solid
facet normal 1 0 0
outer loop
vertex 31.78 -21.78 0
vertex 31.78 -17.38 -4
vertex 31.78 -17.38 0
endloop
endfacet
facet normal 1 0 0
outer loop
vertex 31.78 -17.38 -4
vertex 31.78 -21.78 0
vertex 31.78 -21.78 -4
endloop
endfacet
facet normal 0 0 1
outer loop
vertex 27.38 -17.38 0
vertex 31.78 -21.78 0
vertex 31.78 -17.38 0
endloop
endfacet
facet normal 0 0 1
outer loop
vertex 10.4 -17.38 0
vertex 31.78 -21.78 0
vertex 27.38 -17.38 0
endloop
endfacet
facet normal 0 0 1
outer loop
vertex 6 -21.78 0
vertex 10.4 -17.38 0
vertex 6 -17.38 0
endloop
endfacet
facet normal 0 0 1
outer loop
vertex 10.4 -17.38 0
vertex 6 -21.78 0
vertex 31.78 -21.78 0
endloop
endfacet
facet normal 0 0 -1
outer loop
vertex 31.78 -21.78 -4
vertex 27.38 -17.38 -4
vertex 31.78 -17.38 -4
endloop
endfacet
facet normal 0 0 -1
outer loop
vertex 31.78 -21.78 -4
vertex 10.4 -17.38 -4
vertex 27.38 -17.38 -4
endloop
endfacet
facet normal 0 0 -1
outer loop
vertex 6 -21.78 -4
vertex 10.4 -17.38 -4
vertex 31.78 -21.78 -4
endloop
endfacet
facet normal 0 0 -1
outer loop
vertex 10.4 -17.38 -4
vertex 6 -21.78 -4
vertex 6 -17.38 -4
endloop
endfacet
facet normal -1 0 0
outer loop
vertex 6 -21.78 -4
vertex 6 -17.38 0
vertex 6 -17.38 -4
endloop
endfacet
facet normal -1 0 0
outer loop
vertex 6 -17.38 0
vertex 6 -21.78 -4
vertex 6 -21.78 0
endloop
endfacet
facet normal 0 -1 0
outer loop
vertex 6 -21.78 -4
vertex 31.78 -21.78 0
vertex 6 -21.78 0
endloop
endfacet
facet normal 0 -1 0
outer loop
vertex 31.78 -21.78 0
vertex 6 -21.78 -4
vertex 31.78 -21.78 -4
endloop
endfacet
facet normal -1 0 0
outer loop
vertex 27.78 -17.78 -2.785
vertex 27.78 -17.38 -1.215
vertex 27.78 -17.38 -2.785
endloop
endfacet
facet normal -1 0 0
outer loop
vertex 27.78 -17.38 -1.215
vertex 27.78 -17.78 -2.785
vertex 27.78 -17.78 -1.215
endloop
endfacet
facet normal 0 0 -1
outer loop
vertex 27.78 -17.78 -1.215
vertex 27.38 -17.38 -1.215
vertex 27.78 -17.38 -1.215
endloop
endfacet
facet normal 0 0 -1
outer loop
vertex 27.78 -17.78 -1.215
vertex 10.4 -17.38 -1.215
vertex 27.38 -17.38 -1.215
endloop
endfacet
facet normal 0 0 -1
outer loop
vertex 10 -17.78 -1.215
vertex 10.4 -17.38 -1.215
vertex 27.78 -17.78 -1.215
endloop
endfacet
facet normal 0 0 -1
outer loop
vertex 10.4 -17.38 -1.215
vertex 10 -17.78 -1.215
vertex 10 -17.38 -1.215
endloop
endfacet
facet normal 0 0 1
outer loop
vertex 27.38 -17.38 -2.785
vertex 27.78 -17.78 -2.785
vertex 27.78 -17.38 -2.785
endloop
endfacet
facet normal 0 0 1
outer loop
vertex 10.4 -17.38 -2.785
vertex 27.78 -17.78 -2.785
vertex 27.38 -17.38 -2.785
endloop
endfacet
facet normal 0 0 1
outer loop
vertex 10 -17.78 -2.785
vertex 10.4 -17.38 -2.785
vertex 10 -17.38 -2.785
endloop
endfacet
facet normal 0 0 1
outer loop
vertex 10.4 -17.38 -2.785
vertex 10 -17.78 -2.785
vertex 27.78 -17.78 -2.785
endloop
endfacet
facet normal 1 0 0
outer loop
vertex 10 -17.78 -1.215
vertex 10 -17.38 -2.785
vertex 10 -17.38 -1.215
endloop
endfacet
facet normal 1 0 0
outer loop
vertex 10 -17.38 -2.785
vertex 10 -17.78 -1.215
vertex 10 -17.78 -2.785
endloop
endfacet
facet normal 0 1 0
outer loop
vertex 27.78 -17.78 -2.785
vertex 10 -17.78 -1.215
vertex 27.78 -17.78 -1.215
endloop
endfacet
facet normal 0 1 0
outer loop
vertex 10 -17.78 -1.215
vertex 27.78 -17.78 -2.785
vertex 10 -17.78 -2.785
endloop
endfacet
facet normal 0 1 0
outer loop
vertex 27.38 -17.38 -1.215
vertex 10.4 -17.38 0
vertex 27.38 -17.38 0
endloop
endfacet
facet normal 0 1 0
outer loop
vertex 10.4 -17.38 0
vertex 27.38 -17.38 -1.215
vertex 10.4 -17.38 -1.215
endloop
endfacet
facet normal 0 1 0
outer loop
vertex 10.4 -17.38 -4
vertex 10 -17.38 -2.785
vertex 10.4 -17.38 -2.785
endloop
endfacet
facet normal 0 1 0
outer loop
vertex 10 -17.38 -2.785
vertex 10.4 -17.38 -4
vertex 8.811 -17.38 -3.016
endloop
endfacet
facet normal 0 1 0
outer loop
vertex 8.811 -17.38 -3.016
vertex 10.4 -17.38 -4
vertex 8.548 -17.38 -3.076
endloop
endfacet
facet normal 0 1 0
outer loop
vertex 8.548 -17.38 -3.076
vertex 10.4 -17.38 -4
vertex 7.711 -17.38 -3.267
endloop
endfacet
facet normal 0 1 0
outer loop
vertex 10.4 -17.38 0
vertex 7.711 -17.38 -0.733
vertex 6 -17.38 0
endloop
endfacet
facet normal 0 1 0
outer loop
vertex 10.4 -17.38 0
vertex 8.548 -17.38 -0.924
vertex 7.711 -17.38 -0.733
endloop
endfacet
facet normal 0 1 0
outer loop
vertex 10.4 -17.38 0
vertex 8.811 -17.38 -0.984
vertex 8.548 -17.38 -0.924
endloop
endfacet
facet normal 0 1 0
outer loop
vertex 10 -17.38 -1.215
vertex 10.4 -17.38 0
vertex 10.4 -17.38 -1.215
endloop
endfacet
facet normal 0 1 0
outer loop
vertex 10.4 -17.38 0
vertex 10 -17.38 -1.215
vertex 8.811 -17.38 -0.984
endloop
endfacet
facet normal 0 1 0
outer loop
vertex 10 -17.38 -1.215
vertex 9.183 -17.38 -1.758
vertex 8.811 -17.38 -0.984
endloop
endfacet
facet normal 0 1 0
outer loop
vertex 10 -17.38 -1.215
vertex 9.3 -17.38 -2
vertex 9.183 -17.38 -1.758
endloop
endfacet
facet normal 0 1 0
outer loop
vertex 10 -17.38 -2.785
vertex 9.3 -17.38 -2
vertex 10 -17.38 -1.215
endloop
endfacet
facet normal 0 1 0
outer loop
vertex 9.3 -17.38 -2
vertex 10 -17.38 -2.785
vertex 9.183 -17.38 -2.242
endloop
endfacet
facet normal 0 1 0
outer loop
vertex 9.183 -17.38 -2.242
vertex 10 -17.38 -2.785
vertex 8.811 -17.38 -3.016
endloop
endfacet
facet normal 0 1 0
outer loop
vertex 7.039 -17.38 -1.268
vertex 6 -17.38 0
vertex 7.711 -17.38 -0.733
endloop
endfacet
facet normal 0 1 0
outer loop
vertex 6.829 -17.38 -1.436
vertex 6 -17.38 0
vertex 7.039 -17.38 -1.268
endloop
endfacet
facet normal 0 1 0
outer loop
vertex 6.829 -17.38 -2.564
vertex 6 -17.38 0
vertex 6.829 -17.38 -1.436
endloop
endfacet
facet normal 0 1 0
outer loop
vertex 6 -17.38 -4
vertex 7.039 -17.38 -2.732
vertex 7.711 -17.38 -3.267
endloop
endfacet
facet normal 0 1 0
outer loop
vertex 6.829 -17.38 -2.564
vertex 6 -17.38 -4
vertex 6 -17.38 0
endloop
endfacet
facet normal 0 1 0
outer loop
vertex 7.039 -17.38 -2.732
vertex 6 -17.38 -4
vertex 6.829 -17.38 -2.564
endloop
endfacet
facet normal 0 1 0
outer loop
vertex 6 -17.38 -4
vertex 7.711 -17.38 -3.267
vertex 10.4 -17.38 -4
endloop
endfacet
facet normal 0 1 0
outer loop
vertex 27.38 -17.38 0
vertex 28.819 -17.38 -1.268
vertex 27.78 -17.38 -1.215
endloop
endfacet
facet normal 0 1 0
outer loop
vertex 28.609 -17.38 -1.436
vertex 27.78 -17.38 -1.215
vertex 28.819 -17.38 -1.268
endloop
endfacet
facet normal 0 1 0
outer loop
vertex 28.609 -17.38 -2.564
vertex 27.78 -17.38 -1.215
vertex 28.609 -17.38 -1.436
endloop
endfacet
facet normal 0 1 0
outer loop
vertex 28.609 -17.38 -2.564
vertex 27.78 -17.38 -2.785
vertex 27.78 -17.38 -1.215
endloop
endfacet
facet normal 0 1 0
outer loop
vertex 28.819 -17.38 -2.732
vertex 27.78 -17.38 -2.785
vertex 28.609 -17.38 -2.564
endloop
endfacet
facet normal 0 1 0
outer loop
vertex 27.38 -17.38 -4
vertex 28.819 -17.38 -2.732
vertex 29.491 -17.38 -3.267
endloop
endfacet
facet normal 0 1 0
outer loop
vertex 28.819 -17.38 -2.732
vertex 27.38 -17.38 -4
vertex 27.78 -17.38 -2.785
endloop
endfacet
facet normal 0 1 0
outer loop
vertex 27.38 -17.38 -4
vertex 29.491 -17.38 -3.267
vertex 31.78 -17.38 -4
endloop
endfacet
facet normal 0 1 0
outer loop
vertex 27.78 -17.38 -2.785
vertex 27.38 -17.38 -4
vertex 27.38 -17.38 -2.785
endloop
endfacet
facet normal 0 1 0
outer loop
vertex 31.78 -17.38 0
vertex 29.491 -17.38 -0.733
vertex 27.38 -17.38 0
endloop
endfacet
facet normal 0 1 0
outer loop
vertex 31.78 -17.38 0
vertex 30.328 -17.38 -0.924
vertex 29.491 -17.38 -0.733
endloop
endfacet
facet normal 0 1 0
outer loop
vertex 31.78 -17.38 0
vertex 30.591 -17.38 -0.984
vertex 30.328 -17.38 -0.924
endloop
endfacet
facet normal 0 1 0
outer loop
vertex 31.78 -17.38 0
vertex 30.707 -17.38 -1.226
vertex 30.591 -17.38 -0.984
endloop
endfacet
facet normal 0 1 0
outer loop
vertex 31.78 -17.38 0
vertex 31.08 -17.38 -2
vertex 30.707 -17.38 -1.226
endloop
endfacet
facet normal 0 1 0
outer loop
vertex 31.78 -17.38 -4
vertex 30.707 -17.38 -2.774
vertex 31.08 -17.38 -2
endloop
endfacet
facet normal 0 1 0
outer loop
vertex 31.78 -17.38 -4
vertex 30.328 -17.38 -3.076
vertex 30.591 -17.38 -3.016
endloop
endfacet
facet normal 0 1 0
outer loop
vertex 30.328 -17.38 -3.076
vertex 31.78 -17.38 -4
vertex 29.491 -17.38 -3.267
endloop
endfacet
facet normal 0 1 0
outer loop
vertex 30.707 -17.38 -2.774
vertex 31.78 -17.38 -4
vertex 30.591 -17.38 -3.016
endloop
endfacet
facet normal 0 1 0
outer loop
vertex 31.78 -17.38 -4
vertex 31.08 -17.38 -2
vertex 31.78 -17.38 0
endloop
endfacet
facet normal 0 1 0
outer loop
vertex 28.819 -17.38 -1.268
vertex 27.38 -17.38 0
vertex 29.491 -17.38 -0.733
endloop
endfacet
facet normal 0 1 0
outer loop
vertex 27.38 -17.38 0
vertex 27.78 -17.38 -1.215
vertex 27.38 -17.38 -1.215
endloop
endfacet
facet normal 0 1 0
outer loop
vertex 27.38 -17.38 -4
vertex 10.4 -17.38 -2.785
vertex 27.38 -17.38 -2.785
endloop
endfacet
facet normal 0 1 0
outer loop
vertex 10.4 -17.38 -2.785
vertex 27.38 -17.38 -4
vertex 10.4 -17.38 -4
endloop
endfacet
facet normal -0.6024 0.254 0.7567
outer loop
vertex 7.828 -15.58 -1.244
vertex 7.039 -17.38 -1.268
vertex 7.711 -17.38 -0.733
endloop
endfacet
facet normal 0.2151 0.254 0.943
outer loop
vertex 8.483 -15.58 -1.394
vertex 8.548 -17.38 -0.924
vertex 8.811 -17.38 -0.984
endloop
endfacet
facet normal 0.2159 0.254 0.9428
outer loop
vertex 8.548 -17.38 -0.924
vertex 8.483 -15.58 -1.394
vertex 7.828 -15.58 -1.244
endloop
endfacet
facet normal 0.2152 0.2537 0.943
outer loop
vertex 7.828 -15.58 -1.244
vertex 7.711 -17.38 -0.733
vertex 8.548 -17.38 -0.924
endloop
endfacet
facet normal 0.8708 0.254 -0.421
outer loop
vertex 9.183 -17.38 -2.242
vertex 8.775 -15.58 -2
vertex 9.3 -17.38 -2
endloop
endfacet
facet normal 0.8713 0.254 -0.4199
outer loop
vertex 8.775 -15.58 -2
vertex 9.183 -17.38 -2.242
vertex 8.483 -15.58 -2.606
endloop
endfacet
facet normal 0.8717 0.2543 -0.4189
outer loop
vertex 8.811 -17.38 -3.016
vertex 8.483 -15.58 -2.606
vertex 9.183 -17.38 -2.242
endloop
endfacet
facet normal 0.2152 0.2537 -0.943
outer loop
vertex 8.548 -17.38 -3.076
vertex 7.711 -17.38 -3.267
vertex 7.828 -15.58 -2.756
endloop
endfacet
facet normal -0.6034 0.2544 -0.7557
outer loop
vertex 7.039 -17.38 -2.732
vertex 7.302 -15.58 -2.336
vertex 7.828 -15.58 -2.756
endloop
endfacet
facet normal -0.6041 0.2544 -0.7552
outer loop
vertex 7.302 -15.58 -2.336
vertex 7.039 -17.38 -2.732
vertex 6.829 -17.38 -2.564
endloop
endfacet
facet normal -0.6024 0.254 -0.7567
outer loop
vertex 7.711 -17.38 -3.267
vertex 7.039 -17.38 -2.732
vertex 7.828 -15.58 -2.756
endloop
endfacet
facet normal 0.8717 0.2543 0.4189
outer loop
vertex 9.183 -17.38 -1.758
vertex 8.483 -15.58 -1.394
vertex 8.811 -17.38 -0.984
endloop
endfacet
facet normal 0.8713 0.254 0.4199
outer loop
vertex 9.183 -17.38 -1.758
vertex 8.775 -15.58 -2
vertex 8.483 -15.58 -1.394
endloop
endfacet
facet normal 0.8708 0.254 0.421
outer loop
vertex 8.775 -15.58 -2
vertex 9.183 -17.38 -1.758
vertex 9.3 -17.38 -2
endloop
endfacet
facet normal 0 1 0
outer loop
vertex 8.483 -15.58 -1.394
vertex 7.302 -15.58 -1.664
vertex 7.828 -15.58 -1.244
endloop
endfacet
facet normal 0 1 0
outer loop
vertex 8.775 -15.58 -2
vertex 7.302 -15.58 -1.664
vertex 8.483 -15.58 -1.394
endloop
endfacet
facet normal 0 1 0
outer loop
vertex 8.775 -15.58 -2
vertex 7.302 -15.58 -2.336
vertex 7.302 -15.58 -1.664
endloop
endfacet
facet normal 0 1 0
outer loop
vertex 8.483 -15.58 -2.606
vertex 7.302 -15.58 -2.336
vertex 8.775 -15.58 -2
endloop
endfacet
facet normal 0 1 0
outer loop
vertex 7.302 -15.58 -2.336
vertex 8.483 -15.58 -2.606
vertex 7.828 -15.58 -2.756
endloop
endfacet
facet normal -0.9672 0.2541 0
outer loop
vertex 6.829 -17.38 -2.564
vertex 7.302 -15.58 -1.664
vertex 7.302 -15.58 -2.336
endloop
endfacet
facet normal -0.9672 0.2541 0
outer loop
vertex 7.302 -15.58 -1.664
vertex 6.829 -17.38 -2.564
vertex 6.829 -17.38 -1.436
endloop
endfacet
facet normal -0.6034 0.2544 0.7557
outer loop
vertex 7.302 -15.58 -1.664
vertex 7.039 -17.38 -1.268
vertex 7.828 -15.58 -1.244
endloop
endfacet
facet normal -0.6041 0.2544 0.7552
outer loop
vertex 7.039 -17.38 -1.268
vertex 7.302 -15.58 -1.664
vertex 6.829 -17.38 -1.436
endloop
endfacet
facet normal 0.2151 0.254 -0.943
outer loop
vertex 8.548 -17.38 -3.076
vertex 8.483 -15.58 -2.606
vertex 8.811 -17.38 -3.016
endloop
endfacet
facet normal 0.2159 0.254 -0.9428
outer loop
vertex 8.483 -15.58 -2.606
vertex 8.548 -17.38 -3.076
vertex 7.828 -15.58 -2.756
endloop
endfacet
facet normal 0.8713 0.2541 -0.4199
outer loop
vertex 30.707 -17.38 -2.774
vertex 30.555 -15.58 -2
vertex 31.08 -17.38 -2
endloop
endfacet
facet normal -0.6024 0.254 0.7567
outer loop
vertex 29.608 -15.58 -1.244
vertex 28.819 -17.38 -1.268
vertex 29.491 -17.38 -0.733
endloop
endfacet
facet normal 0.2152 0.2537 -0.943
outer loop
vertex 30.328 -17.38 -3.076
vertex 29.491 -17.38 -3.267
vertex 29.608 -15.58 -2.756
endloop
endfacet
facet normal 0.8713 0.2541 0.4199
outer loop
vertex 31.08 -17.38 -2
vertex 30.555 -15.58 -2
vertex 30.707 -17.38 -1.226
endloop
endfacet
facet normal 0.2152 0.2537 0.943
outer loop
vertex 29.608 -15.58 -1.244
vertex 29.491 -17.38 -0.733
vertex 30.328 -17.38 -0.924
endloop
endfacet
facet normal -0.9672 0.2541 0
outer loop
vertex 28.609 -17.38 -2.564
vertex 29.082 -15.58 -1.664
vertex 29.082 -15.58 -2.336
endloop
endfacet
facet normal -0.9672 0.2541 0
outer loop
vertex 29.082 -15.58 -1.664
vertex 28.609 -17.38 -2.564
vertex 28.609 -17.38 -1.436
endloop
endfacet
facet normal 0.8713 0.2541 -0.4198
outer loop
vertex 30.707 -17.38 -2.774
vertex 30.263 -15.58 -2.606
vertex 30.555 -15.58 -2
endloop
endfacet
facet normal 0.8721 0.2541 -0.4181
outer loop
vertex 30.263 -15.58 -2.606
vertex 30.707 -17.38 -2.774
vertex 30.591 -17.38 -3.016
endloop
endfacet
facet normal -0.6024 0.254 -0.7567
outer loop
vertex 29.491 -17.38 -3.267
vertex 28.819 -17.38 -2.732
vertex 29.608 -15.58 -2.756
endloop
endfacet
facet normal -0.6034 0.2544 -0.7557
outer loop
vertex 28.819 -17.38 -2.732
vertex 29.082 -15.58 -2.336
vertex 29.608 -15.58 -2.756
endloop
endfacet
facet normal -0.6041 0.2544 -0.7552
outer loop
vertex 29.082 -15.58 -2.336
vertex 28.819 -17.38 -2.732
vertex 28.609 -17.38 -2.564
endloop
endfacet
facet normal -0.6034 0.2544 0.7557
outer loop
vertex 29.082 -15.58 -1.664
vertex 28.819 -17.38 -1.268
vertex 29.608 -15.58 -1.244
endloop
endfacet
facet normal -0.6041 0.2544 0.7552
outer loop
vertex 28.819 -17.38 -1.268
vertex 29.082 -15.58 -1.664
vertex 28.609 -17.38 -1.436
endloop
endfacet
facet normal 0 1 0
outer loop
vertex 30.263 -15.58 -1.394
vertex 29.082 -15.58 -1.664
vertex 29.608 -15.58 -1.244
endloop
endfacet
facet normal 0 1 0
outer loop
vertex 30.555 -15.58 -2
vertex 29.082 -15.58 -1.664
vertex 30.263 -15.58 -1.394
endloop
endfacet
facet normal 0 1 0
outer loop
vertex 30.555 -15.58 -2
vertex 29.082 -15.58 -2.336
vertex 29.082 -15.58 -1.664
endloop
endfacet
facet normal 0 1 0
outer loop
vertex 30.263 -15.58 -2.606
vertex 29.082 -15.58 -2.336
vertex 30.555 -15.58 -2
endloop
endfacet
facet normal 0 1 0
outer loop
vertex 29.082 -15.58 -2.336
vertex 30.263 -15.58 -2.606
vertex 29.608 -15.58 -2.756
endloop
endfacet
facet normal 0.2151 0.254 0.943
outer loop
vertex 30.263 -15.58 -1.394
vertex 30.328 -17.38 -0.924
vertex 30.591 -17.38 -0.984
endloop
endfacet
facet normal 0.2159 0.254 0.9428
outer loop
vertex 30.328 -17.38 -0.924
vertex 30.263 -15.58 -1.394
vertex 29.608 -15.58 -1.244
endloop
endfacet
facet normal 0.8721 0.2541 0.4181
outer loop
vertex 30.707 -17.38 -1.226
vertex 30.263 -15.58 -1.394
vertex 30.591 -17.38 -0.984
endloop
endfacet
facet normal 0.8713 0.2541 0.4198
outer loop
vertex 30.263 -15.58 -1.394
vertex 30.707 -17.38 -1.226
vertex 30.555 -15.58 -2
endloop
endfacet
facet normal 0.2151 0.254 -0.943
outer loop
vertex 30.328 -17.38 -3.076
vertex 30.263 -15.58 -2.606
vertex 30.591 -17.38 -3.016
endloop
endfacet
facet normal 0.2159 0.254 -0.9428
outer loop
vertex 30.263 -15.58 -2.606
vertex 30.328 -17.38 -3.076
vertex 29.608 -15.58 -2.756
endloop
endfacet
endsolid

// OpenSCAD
// file: teensy-holder.scad
/*
--- BEGIN AGPLv3-preamble ---
Dactyl Marshmallow ergonomic keyboard generator
Copyright (C) 2015, 2018 Matthew Adereth and Jared Jennings

This program is free software: you can redistribute it and/or modify
it under the terms of the GNU Affero General Public License as published by
the Free Software Foundation, either version 3 of the License, or
(at your option) any later version.

This program is distributed in the hope that it will be useful,
but WITHOUT ANY WARRANTY; without even the implied warranty of
MERCHANTABILITY or FITNESS FOR A PARTICULAR PURPOSE.  See the
GNU Affero General Public License for more details.

You should have received a copy of the GNU Affero General Public License
along with this program.  If not, see <http://www.gnu.org/licenses/>.
--- END AGPLv3-preamble ---
*/
/*
*/
frame_thickness = 4;
small=0.01;
tau=360;

/* https://www.pjrc.com/teensy/dimensions.html
teensy lc */
tb_width = 17.78;
tb_length = 35.56;
tb_thickness = 1.57;
tb_margin = 0.8;

/* https://www.cs.jhu.edu/~carlson/download/datasheets/Micro-USB_1_01.pdf
*/
overmold_width = 11;
overmold_height = 9;

/* How much smaller the bumps are than the holes. First refined in the
 * frame glue joints. */
bump_tolerance = 0.1;
/* Hole diameter is set empirically, so that given the fn used, it
looks like the walls of the hole will be thick enough */
hole_diameter = frame_thickness - 0.5;
hole_fn = 7;

/* M3 screw */
screw_diameter = 3;

module teensy_holder() {
    difference() {
        union() {
             /* square at USB end leaving clearance for largest
              * possible connector overmold */
            translate([0, 
            tb_length/2+frame_thickness/2, 0]) {
                cube(size=[
                overmold_width+2*frame_thickness,
                frame_thickness,
                overmold_height+2*frame_thickness],
                center=true);
            }
            /* main frame */
            cube(size=[
                tb_width+2*frame_thickness,
                tb_length+2*frame_thickness,
                frame_thickness], center=true);
        }
        /* the board */
        cube(size=[
            tb_width, tb_length,
            tb_thickness],
            center=true);
        /* a little extra plastic on top and below the board, to hold
         * it in */
        cube(size=[
            tb_width - tb_margin,
            tb_length - tb_margin,
            frame_thickness+small],
            center=true);
        /* connector overmold */
        translate([0, tb_length/2, 0]) {
            cube(size=[
            overmold_width,
            2*frame_thickness+small,
            overmold_height], center=true);
        }
        /* you know, i bet we don't need the bottom half of that
         * overmold surround */
        translate([0, 0, -(frame_thickness/2 + overmold_height/2)]) {
             cube(size=[2*tb_width, 2*tb_length, overmold_height],
                  center=true);
        }
    }
}

/* left of x=0 */
module tab () {
     translate([-screw_diameter*2, 0, 0]) {
          difference () {
               union () {
                    cylinder(h=frame_thickness,
                             d=screw_diameter+frame_thickness*2,
                             center=true,
                             $fn=15);
                    translate([screw_diameter, 0, 0]) {
                         cube([screw_diameter*2,
                               screw_diameter+frame_thickness*2,
                               frame_thickness],
                              center=true);
                    }
               }
               cylinder(h=frame_thickness+small,
                        d=screw_diameter,
                        center=true,
                        $fn=15);
          }
     }
}

module teensy_holder_piece_a () {
     translate([(tb_width/2+frame_thickness+screw_diameter*2),
                0,
                (-frame_thickness/2)]) {
          union() {
               difference() {
                    intersection() {
                         translate([0, frame_thickness+tb_margin/2+small/2, 0]) {
                              cube(size=[
                                        tb_width+2*frame_thickness+small,
                                        tb_length+2*frame_thickness+small,
                                        overmold_height+2*frame_thickness+small],
                                   center=true);
                         }
                         teensy_holder() {}
                    }
                    translate([-(tb_width/2 + frame_thickness/2),
                               -(tb_length/2 + tb_margin),
                               0]) {
                         rotate(-tau/4,[1,0,0]) {
                              cylinder(h=3,
                                       d1=hole_diameter,
                                       d2=hole_diameter/2,
                                       $fn=hole_fn);
                         }
                    }
                    translate([(tb_width/2 + frame_thickness/2),
                               -(tb_length/2 + tb_margin),
                               0]) {
                         rotate(-tau/4,[1,0,0]) {
                              cylinder(h=3,
                                       d1=hole_diameter,
                                       d2=hole_diameter/2,
                                       $fn=hole_fn);
                         }
                    }
               }
               translate([-(tb_width/2+frame_thickness), 0, 0]) {
                    tab() {}
               }
          }
     }
}

module teensy_holder_piece_b () {
     translate([(tb_width/2+frame_thickness+screw_diameter*2),
                0,
                (-frame_thickness/2)]) {
          union() {
              intersection() {
                   translate([0, -(tb_length+frame_thickness)/2, 0]) {
                        cube(size=[tb_width+2*frame_thickness+small,
                                   frame_thickness+tb_margin,
                                   overmold_height+2*frame_thickness+small],
                             center=true);
                   }
                   teensy_holder() {}
              }
              translate([-(tb_width/2 + frame_thickness/2),
                         -(tb_length/2 + tb_margin),
                         0]) {
                   rotate(-tau/4,[1,0,0]) {
                        cylinder(h=3,
                                 d1=hole_diameter-(bump_tolerance*2),
                                 d2=hole_diameter/2-(bump_tolerance*2),
                                 $fn=hole_fn);
                   }
              }
              translate([(tb_width/2 + frame_thickness/2),
                         -(tb_length/2 + tb_margin),
                         0]) {
                   rotate(-tau/4,[1,0,0]) {
                        cylinder(h=3,
                                 d1=hole_diameter-(bump_tolerance*2),
                                 d2=hole_diameter/2-(bump_tolerance*2),
                                 $fn=hole_fn);
                   }
              }
          }
     }
}
// main file
/*
--- BEGIN AGPLv3-preamble ---
Dactyl Marshmallow ergonomic keyboard generator
Copyright (C) 2015, 2018 Matthew Adereth and Jared Jennings

This program is free software: you can redistribute it and/or modify
it under the terms of the GNU Affero General Public License as published by
the Free Software Foundation, either version 3 of the License, or
(at your option) any later version.

This program is distributed in the hope that it will be useful,
but WITHOUT ANY WARRANTY; without even the implied warranty of
MERCHANTABILITY or FITNESS FOR A PARTICULAR PURPOSE.  See the
GNU Affero General Public License for more details.

You should have received a copy of the GNU Affero General Public License
along with this program.  If not, see <http://www.gnu.org/licenses/>.
--- END AGPLv3-preamble ---
*/
/*
*/
use <teensy-holder.scad>;

teensy_holder_piece_b() {}
